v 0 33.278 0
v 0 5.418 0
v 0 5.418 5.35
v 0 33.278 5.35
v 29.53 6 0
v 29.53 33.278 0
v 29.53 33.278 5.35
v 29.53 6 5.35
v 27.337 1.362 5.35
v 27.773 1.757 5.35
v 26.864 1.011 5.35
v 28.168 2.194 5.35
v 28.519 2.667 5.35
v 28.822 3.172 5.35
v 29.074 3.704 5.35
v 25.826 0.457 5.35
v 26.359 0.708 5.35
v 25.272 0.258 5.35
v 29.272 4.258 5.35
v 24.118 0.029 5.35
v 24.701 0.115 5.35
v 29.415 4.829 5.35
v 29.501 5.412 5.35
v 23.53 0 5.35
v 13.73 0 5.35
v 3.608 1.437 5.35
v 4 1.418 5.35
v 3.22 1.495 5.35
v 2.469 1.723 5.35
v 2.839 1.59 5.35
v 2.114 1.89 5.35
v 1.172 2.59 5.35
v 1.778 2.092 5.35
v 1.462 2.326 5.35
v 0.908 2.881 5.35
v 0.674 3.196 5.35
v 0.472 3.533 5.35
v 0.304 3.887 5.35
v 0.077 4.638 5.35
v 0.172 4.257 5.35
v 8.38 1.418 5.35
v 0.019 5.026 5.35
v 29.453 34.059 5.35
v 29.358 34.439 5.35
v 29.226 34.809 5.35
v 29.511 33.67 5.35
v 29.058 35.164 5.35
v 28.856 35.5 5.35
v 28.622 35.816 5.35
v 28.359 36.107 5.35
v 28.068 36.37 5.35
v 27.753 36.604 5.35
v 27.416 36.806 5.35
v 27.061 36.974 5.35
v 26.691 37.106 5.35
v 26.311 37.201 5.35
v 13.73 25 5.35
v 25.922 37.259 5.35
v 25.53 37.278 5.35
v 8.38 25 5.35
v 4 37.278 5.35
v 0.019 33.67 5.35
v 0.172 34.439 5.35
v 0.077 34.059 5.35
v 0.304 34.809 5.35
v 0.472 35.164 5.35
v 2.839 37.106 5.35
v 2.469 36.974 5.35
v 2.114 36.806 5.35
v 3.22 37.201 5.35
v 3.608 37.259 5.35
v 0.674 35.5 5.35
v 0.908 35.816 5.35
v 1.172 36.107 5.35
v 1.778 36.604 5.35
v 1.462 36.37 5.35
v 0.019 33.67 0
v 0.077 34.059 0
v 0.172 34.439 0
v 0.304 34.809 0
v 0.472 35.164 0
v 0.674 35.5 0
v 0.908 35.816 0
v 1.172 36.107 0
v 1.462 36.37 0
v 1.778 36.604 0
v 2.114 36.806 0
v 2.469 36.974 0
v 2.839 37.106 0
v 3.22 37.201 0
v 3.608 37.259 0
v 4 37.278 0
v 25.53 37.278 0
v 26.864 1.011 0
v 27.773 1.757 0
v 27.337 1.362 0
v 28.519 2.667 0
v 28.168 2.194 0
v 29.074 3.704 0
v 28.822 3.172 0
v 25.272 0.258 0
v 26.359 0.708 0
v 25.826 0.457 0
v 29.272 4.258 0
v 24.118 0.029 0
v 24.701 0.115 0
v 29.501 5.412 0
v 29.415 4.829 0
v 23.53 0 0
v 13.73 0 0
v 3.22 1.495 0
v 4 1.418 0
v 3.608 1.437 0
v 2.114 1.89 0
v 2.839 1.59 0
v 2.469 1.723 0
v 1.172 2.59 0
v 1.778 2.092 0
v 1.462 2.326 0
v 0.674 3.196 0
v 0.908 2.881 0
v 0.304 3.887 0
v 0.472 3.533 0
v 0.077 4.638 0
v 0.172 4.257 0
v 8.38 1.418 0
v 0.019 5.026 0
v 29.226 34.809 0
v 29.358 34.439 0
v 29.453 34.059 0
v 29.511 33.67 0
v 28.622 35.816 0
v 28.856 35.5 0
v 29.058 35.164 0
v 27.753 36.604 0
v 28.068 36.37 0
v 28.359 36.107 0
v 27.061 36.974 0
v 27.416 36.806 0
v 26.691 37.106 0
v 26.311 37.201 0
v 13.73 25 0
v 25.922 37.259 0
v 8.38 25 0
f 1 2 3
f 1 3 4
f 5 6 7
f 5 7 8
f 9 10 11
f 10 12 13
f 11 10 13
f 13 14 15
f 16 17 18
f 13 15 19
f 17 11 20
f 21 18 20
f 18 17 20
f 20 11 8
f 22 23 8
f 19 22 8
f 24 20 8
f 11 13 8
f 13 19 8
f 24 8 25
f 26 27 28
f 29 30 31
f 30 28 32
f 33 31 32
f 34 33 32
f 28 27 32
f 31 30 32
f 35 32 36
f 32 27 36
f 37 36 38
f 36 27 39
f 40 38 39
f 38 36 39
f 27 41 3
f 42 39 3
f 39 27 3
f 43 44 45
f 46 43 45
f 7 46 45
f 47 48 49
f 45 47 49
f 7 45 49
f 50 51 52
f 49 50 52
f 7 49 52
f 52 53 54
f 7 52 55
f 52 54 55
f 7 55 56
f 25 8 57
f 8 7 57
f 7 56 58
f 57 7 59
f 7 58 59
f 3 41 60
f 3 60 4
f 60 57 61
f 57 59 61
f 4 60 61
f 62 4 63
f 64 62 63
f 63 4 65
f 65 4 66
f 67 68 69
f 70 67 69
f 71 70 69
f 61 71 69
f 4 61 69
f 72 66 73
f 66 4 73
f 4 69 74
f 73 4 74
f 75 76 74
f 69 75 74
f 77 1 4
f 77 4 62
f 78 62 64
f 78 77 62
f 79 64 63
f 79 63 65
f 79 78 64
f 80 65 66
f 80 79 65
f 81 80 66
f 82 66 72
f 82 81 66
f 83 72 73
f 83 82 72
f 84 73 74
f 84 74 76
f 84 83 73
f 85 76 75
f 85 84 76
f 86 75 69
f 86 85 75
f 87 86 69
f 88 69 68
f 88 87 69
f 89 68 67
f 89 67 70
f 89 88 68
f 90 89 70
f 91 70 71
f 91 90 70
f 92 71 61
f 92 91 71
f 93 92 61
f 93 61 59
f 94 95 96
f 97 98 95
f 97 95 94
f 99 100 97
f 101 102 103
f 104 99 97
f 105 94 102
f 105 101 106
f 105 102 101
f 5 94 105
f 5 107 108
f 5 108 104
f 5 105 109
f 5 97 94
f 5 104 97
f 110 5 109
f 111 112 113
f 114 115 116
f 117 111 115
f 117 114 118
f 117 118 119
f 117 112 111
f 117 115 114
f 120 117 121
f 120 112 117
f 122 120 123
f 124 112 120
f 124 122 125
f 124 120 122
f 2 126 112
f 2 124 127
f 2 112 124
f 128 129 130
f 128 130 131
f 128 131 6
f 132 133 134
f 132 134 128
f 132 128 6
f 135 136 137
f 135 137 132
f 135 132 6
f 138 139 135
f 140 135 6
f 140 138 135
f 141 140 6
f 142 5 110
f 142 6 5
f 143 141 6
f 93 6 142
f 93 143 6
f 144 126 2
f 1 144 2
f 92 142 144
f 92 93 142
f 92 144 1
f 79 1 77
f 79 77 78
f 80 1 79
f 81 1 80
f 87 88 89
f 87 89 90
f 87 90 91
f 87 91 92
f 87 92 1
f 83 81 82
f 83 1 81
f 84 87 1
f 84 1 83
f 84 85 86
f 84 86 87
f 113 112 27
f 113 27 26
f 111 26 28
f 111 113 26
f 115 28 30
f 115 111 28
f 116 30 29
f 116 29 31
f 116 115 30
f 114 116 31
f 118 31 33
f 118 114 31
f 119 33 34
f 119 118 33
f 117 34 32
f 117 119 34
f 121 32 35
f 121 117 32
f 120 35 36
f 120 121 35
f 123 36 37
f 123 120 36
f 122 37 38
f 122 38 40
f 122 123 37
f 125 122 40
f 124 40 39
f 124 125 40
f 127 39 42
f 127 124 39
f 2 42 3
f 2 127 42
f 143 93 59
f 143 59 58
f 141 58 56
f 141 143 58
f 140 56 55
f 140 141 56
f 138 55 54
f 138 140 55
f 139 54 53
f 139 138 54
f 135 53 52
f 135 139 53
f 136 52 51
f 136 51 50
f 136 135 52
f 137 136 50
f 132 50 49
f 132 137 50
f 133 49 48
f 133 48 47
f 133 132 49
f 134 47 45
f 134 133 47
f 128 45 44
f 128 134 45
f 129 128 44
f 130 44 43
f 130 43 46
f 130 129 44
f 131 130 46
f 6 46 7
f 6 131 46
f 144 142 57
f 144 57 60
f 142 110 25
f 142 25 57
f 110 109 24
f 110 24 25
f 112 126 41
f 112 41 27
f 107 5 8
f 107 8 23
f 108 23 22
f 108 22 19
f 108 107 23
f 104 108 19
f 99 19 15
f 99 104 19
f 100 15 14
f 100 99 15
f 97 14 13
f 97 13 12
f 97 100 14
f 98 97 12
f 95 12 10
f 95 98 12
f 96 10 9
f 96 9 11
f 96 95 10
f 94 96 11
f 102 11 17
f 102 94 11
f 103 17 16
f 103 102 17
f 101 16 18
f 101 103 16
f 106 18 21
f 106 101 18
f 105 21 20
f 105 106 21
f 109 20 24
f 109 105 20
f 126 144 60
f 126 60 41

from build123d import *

# Parameters (mm, degrees)
BOSS_EXTRUDE1_DEPTH = 5.35


with BuildPart() as part:
    # Model → Boss-Extrude1 (new body)
    with BuildSketch(Plane.XY):
        with BuildLine():
            Line((23.530324921, 0), (13.730324805, 0))
            Line((13.730324805, 0), (13.730324805, 25.000000373))
            Line((13.730324805, 25.000000373), (8.38032458, 25.000000373))
            Line((8.38032458, 25.000000373), (8.38032458, 1.418154687))
            Line((8.38032458, 1.418154687), (4, 1.418154687))
            ThreePointArc((4, 1.418154687), (1.171572808, 2.589727629), (0, 5.418154877))
            Line((0, 5.418154877), (0, 33.278149277))
            ThreePointArc((0, 33.278149277), (1.171572778, 36.106576304), (3.999999724, 37.278149277))
            Line((3.999999724, 37.278149277), (25.530324042, 37.278149277))
            ThreePointArc((25.530324042, 37.278149277), (28.358750081, 36.106577487), (29.530324042, 33.278152347))
            Line((29.530324042, 33.278152347), (29.530324042, 6))
            ThreePointArc((29.530324042, 6), (27.77296504, 1.757359624), (23.530324921, 0))
        make_face()
    extrude(amount=BOSS_EXTRUDE1_DEPTH)


solid = part.part
